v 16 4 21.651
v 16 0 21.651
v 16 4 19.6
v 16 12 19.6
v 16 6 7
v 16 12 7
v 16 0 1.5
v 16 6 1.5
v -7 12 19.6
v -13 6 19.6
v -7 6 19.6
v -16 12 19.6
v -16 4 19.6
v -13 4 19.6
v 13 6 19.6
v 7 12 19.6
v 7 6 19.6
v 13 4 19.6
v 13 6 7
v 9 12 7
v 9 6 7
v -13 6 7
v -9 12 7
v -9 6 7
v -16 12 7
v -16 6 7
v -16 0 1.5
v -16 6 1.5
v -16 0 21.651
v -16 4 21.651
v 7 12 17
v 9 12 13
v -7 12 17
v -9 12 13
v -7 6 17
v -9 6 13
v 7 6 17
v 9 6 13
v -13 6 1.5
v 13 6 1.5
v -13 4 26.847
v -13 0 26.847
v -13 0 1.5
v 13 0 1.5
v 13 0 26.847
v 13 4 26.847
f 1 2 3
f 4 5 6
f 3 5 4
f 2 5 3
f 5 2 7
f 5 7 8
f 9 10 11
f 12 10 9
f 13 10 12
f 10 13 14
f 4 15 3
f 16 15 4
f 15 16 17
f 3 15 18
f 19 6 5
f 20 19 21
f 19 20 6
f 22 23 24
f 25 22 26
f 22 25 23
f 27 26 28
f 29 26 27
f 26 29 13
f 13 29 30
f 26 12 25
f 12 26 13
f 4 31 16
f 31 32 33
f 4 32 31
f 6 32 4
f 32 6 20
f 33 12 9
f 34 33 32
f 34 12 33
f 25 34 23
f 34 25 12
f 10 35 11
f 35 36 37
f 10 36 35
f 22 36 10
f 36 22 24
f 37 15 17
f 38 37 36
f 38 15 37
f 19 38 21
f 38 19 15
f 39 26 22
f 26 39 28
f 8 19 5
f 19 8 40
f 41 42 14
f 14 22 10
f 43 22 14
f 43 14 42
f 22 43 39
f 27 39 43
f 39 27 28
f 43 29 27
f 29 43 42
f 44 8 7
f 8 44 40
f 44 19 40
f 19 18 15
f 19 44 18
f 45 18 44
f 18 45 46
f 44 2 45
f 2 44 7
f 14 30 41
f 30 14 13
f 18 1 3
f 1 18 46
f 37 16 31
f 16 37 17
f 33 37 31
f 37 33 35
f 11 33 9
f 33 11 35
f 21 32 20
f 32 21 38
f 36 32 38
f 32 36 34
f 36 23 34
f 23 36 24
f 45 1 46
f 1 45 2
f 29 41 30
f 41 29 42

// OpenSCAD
/*
 * Kaminari
 *
 * Copyright (C) 2020 Richard "Shred" Körber
 *   https://github.com/shred/kaminari
 *
 * This program is free software: you can redistribute it and/or modify
 * it under the terms of the GNU General Public License as published by
 * the Free Software Foundation, either version 3 of the License, or
 * (at your option) any later version.
 *
 * This program is distributed in the hope that it will be useful,
 * but WITHOUT ANY WARRANTY; without even the implied warranty of
 * MERCHANTABILITY or FITNESS FOR A PARTICULAR PURPOSE.  See the
 * GNU General Public License for more details.
 */

use <kaminari.scad>
middle2();
